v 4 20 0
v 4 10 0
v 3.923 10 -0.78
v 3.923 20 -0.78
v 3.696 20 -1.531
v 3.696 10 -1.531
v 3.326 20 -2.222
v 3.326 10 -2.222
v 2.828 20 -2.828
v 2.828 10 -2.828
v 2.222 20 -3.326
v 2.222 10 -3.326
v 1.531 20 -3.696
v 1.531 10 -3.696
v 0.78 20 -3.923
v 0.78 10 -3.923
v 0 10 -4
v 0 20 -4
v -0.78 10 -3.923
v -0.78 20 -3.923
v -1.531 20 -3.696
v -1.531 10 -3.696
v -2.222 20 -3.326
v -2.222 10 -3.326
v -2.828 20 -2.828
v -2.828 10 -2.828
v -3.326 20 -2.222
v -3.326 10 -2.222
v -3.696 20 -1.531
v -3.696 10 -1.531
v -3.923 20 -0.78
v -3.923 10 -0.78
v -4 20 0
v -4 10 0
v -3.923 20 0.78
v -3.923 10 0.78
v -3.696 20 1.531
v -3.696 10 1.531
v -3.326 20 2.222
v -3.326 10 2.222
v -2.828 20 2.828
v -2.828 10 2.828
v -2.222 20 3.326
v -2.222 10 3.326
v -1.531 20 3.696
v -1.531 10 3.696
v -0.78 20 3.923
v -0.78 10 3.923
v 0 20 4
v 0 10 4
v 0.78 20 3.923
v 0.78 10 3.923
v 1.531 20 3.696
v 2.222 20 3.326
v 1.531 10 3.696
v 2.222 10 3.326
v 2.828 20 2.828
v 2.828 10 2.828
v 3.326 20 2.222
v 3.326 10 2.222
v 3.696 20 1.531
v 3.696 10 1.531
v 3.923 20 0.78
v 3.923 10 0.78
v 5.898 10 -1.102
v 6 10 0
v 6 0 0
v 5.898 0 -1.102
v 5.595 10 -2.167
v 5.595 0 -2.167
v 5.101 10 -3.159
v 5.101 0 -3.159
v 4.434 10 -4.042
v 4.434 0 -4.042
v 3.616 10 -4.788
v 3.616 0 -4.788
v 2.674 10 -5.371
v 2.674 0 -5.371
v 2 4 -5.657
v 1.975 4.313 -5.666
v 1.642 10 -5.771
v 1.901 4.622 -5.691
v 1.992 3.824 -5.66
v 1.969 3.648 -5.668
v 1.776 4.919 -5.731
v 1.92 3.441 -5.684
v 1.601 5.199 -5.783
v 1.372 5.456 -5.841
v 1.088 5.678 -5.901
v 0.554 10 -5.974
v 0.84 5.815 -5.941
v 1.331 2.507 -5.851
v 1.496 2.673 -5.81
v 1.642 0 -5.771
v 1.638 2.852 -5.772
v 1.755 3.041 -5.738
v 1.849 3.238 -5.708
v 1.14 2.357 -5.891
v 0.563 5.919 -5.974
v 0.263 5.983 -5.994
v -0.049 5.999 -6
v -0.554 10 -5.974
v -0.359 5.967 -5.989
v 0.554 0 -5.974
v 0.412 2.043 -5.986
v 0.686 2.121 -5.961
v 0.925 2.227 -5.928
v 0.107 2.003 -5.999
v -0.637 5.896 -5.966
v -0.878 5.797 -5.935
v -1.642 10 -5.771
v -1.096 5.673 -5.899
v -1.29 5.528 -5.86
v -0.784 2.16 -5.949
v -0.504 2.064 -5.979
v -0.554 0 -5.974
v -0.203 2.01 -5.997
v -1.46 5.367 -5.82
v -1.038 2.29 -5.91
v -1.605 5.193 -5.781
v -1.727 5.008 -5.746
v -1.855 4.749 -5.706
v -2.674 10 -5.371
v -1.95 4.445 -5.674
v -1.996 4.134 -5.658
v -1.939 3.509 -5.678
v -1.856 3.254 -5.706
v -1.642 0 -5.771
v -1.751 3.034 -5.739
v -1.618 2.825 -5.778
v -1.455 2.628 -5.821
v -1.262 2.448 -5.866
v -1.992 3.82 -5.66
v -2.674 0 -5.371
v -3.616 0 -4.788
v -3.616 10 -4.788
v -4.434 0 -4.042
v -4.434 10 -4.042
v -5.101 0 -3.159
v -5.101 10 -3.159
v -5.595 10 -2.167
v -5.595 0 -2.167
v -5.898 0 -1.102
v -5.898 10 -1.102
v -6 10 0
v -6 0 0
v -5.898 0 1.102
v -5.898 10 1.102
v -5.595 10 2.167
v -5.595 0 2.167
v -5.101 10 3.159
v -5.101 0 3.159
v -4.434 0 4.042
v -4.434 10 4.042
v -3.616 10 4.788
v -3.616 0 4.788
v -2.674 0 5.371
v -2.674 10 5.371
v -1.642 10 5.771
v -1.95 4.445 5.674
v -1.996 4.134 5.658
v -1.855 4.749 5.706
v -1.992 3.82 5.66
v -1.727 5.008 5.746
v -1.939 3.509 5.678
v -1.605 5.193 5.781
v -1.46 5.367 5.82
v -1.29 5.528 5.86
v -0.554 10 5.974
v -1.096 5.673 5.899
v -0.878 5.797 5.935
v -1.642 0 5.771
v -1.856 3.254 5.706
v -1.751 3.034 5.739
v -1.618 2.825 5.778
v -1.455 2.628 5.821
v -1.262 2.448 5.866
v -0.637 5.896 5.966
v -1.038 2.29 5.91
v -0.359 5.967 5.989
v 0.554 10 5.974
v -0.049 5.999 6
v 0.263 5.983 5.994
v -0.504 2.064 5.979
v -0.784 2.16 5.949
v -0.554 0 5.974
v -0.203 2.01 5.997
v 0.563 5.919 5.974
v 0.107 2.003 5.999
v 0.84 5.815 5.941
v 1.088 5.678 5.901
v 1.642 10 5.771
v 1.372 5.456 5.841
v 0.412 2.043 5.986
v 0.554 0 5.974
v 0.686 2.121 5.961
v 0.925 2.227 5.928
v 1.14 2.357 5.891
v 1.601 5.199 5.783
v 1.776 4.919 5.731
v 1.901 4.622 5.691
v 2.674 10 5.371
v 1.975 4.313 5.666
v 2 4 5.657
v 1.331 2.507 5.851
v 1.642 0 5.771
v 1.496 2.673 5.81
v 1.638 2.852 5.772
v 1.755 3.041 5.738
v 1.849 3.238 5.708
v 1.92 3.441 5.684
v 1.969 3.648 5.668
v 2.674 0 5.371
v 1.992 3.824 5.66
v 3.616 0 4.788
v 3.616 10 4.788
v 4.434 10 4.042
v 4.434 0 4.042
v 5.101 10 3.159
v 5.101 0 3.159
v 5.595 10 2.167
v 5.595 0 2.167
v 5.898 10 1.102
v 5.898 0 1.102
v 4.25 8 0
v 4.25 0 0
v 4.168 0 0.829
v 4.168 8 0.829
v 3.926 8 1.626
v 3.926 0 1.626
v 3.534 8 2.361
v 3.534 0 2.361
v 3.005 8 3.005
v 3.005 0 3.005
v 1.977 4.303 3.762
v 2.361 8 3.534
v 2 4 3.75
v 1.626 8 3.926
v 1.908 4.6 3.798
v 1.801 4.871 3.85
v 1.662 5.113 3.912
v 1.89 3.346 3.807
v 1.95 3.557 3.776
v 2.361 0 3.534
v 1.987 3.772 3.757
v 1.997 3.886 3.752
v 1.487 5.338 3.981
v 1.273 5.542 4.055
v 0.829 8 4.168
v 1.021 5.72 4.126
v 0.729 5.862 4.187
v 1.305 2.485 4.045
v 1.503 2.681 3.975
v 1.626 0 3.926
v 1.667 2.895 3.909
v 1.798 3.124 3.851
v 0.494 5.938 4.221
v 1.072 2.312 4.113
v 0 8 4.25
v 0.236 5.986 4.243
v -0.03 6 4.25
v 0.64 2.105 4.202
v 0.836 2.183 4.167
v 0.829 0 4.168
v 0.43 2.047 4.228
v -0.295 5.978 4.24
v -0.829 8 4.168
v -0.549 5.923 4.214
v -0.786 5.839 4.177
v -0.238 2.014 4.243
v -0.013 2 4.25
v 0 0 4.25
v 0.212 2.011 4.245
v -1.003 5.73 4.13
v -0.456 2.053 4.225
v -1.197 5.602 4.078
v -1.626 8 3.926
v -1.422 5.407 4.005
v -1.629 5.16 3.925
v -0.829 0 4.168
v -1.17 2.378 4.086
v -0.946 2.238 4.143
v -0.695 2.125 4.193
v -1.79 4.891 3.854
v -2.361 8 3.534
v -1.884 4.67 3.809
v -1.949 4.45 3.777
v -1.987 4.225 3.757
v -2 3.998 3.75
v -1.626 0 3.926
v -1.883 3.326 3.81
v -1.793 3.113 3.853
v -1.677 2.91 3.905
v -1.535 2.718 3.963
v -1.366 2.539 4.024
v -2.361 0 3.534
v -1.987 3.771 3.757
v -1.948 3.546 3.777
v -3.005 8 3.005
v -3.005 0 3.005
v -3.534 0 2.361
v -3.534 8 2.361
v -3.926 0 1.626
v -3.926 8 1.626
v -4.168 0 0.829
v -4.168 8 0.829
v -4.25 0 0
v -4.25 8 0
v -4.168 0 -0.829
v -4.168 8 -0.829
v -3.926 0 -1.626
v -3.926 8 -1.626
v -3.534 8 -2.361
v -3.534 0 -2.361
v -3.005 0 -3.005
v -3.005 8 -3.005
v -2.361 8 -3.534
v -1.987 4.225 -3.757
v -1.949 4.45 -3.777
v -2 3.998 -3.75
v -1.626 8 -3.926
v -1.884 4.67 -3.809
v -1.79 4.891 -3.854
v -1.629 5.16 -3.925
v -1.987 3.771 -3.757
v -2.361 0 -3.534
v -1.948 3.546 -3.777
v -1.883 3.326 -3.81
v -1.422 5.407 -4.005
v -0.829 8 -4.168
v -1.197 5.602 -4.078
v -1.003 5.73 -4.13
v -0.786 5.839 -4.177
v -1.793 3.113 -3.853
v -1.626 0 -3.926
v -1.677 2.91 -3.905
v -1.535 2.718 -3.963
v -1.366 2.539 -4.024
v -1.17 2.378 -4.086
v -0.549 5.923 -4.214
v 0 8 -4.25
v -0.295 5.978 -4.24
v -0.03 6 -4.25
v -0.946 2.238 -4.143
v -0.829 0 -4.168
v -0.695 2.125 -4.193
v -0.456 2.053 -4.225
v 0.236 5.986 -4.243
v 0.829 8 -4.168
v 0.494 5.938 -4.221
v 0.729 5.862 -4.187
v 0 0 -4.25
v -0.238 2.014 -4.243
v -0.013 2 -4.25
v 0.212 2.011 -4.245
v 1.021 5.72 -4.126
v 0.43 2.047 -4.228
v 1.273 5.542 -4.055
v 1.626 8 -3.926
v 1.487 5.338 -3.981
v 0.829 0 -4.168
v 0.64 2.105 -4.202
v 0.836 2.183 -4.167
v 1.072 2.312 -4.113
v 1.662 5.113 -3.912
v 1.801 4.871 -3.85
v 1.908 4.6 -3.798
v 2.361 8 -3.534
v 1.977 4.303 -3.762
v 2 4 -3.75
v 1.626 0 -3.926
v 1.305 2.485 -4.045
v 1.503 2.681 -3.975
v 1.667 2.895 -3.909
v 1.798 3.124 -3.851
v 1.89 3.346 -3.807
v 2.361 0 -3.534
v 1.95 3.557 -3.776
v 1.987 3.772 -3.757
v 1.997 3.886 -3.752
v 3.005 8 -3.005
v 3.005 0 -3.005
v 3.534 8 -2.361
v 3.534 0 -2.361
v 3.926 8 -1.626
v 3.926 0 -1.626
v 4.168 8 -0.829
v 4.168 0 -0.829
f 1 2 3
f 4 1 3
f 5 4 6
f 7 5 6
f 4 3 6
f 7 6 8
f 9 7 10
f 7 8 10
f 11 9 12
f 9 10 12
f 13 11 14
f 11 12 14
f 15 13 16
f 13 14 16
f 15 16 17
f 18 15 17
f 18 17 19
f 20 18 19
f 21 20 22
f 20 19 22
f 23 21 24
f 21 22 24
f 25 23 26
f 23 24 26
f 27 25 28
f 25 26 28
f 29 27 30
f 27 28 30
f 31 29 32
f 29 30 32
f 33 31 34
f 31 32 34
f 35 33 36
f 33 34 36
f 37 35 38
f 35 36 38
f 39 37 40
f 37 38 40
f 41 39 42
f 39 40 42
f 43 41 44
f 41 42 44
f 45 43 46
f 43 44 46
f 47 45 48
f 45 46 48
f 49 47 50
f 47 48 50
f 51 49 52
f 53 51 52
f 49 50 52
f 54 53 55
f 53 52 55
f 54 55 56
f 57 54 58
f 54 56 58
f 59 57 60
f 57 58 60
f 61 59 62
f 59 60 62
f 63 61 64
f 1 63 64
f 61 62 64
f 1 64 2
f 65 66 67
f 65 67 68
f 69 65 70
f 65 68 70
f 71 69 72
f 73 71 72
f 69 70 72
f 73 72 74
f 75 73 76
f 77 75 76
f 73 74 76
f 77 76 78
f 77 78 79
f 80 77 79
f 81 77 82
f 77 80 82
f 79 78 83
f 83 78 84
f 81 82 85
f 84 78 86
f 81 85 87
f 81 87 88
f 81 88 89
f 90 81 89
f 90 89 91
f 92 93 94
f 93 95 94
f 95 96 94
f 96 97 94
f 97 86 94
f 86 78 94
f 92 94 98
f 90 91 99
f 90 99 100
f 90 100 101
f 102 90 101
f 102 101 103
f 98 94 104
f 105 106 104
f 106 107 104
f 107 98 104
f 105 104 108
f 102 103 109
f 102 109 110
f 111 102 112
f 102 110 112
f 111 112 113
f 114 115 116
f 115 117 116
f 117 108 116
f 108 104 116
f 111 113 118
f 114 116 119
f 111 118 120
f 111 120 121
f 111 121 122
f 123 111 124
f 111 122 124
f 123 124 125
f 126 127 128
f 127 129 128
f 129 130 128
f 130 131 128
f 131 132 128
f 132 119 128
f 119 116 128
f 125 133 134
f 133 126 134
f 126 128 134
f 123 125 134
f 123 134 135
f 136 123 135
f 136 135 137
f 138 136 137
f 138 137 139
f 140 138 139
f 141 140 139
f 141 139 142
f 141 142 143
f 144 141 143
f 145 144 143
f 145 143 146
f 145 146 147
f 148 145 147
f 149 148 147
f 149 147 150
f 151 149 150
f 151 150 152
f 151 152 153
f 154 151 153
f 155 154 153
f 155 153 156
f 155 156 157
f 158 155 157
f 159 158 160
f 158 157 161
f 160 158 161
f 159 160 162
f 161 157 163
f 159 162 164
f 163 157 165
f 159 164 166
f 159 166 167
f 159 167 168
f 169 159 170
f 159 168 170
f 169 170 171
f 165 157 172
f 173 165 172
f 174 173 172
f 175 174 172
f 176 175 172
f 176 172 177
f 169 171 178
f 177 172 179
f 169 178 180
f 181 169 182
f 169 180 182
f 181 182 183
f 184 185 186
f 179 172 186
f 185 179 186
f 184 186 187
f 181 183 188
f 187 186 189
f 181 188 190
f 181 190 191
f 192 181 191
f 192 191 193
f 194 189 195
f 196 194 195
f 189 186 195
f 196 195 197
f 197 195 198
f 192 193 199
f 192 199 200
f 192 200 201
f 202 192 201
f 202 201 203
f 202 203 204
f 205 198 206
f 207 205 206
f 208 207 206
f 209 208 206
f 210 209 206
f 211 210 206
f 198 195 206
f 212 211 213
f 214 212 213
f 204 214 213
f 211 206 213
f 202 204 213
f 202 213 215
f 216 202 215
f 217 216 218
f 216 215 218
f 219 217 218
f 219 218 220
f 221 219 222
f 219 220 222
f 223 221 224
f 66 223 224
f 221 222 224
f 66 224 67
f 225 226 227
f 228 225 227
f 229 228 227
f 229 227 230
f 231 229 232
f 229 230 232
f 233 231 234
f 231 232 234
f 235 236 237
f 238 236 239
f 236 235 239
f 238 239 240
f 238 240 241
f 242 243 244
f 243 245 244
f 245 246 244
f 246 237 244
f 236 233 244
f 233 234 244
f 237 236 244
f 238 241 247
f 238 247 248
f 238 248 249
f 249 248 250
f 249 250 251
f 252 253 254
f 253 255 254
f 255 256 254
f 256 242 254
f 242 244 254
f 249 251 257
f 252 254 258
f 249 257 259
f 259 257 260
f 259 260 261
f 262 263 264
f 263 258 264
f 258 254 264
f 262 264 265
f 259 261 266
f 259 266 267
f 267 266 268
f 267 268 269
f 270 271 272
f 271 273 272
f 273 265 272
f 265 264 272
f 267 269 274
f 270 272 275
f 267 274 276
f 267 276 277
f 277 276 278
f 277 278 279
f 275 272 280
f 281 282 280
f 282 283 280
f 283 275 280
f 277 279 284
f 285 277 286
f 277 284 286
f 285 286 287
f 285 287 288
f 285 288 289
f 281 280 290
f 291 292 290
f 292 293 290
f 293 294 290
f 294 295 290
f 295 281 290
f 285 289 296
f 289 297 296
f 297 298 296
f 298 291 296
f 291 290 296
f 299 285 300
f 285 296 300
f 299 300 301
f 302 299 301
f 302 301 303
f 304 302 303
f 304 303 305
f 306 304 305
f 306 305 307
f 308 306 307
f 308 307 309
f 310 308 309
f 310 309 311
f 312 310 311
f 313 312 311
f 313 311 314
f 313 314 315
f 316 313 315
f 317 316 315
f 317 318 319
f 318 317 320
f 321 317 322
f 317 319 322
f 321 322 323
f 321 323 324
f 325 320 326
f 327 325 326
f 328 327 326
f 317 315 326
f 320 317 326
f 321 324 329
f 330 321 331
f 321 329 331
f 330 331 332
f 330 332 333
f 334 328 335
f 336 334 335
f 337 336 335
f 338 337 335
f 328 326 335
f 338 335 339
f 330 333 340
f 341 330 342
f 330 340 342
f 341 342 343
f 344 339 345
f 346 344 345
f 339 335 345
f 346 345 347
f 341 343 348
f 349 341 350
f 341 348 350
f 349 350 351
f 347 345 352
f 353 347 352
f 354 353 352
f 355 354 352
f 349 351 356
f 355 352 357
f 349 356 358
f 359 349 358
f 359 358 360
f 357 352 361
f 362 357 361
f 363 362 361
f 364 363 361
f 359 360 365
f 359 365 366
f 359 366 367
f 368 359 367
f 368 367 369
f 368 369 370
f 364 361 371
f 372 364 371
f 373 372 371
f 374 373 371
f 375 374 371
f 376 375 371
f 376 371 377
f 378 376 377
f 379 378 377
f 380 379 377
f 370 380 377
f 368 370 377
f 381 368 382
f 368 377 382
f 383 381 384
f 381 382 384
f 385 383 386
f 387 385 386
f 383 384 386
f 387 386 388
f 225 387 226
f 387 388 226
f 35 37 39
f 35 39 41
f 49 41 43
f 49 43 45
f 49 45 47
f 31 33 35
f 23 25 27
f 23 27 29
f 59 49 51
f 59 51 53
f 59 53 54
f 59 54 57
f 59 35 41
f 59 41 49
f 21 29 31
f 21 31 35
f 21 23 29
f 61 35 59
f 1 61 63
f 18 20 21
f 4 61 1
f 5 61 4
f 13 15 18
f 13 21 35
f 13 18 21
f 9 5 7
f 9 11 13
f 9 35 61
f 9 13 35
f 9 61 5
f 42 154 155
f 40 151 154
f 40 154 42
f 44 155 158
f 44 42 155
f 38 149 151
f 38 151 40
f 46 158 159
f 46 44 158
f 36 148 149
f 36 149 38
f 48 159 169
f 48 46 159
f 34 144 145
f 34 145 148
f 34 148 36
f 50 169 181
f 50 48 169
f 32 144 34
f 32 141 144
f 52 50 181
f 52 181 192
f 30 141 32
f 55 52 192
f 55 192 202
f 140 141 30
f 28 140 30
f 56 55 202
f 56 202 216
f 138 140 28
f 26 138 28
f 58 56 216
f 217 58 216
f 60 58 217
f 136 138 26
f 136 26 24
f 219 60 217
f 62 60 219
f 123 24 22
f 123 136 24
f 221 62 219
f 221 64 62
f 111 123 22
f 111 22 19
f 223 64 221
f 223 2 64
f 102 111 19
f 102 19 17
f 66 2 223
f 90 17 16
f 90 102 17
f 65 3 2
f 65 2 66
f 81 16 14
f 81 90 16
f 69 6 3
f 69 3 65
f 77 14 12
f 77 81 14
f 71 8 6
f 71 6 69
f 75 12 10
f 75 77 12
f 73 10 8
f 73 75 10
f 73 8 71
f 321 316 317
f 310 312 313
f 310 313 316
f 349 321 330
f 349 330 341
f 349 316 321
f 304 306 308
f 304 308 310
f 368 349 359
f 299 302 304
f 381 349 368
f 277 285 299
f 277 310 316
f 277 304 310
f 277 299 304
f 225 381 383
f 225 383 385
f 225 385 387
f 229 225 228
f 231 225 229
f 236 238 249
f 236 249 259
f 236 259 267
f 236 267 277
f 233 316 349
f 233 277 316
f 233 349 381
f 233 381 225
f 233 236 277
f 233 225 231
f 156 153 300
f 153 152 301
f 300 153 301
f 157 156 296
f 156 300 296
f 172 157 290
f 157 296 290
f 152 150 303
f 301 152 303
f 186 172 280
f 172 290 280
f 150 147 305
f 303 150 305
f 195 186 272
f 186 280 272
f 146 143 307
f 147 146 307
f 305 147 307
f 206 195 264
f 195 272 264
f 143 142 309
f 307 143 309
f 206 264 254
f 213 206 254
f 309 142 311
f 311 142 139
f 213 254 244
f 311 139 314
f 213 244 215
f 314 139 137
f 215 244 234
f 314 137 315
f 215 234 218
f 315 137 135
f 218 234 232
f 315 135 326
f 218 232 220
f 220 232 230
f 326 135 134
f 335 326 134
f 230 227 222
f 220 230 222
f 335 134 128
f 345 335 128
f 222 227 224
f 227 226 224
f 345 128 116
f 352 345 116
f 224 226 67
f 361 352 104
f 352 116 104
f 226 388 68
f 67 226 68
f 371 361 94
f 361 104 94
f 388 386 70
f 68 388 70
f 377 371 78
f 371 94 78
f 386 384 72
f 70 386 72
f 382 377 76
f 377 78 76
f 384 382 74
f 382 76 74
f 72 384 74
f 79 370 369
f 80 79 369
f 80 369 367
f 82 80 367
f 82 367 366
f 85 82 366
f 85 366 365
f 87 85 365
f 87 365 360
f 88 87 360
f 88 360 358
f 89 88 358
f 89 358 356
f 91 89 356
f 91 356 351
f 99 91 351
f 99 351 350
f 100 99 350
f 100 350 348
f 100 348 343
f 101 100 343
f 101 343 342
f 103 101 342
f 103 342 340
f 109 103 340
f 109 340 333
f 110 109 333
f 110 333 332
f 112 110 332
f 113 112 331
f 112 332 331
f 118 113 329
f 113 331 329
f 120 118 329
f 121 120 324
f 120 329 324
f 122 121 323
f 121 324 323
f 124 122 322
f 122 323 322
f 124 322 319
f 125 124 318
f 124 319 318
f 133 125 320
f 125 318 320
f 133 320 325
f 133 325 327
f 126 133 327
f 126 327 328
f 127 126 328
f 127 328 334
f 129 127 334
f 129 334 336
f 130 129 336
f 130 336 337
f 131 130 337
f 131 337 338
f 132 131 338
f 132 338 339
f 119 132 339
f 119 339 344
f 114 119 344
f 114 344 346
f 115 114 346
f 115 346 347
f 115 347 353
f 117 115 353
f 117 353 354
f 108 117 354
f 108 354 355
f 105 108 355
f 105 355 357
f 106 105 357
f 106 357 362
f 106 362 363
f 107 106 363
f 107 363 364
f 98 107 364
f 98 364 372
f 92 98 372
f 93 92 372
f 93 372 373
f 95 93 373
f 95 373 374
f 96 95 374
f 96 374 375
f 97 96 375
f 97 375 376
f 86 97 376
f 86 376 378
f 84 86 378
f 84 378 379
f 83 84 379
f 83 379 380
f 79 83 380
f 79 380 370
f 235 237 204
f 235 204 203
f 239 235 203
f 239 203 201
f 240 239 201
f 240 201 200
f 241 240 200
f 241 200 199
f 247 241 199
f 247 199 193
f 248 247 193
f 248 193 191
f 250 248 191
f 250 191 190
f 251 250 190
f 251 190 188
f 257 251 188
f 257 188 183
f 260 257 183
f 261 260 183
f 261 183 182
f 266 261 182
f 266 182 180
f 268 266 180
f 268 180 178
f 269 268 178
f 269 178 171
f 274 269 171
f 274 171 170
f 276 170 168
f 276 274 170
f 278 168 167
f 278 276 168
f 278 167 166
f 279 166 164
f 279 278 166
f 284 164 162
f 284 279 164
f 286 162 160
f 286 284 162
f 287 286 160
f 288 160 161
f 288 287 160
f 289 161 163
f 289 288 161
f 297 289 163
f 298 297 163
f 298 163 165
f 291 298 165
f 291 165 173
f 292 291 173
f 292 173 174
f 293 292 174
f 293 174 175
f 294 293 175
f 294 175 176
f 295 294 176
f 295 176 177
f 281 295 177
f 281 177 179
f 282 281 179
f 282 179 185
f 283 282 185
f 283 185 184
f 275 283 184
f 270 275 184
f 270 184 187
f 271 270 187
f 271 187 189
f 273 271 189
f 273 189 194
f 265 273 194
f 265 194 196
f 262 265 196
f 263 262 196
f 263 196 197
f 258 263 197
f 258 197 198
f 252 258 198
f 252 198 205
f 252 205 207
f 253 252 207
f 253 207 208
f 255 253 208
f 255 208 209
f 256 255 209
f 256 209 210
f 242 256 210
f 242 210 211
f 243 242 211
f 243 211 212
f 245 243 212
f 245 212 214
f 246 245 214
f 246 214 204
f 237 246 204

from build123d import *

# Parameters (mm, degrees)
CROQUIS1_R                 = 6
SALIENTE_EXTRUIR1_DEPTH    = 10
CROQUIS2_R                 = 4
SALIENTE_EXTRUIR2_DEPTH    = 10
CROQUIS3_R                 = 4.25
CORTAR_EXTRUIR1_DEPTH      = 8
CROQUIS4_R                 = 2
CORTAR_EXTRUIR2_DEPTH      = 7
CORTAR_EXTRUIR2_DEPTH_BACK = 7


with BuildPart() as part:
    # Croquis1 → Saliente-Extruir1 (new body)
    with BuildSketch(Plane(origin=(0, 0, 0), x_dir=(1, 0, 0), z_dir=(0, 1, 0))):
        Circle(CROQUIS1_R)
    extrude(amount=SALIENTE_EXTRUIR1_DEPTH)

    # Croquis2 → Saliente-Extruir2 (add)
    with BuildSketch(Plane(origin=(0, 10, 0), x_dir=(1, 0, 0), z_dir=(0, 1, 0))):
        Circle(CROQUIS2_R)
    extrude(amount=SALIENTE_EXTRUIR2_DEPTH)

    # Croquis3 → Cortar-Extruir1 (cut)
    with BuildSketch(Plane.XZ):
        Circle(CROQUIS3_R)
    extrude(amount=-CORTAR_EXTRUIR1_DEPTH, mode=Mode.SUBTRACT)

    # Croquis4 → Cortar-Extruir2 (cut, two sides)
    with BuildSketch(Plane.XY) as cortar_extruir2_sk:
        with Locations((0, 4)):
            Circle(CROQUIS4_R)
    extrude(amount=CORTAR_EXTRUIR2_DEPTH, mode=Mode.SUBTRACT)
    extrude(cortar_extruir2_sk.sketch, amount=-CORTAR_EXTRUIR2_DEPTH_BACK, mode=Mode.SUBTRACT)


solid = part.part
